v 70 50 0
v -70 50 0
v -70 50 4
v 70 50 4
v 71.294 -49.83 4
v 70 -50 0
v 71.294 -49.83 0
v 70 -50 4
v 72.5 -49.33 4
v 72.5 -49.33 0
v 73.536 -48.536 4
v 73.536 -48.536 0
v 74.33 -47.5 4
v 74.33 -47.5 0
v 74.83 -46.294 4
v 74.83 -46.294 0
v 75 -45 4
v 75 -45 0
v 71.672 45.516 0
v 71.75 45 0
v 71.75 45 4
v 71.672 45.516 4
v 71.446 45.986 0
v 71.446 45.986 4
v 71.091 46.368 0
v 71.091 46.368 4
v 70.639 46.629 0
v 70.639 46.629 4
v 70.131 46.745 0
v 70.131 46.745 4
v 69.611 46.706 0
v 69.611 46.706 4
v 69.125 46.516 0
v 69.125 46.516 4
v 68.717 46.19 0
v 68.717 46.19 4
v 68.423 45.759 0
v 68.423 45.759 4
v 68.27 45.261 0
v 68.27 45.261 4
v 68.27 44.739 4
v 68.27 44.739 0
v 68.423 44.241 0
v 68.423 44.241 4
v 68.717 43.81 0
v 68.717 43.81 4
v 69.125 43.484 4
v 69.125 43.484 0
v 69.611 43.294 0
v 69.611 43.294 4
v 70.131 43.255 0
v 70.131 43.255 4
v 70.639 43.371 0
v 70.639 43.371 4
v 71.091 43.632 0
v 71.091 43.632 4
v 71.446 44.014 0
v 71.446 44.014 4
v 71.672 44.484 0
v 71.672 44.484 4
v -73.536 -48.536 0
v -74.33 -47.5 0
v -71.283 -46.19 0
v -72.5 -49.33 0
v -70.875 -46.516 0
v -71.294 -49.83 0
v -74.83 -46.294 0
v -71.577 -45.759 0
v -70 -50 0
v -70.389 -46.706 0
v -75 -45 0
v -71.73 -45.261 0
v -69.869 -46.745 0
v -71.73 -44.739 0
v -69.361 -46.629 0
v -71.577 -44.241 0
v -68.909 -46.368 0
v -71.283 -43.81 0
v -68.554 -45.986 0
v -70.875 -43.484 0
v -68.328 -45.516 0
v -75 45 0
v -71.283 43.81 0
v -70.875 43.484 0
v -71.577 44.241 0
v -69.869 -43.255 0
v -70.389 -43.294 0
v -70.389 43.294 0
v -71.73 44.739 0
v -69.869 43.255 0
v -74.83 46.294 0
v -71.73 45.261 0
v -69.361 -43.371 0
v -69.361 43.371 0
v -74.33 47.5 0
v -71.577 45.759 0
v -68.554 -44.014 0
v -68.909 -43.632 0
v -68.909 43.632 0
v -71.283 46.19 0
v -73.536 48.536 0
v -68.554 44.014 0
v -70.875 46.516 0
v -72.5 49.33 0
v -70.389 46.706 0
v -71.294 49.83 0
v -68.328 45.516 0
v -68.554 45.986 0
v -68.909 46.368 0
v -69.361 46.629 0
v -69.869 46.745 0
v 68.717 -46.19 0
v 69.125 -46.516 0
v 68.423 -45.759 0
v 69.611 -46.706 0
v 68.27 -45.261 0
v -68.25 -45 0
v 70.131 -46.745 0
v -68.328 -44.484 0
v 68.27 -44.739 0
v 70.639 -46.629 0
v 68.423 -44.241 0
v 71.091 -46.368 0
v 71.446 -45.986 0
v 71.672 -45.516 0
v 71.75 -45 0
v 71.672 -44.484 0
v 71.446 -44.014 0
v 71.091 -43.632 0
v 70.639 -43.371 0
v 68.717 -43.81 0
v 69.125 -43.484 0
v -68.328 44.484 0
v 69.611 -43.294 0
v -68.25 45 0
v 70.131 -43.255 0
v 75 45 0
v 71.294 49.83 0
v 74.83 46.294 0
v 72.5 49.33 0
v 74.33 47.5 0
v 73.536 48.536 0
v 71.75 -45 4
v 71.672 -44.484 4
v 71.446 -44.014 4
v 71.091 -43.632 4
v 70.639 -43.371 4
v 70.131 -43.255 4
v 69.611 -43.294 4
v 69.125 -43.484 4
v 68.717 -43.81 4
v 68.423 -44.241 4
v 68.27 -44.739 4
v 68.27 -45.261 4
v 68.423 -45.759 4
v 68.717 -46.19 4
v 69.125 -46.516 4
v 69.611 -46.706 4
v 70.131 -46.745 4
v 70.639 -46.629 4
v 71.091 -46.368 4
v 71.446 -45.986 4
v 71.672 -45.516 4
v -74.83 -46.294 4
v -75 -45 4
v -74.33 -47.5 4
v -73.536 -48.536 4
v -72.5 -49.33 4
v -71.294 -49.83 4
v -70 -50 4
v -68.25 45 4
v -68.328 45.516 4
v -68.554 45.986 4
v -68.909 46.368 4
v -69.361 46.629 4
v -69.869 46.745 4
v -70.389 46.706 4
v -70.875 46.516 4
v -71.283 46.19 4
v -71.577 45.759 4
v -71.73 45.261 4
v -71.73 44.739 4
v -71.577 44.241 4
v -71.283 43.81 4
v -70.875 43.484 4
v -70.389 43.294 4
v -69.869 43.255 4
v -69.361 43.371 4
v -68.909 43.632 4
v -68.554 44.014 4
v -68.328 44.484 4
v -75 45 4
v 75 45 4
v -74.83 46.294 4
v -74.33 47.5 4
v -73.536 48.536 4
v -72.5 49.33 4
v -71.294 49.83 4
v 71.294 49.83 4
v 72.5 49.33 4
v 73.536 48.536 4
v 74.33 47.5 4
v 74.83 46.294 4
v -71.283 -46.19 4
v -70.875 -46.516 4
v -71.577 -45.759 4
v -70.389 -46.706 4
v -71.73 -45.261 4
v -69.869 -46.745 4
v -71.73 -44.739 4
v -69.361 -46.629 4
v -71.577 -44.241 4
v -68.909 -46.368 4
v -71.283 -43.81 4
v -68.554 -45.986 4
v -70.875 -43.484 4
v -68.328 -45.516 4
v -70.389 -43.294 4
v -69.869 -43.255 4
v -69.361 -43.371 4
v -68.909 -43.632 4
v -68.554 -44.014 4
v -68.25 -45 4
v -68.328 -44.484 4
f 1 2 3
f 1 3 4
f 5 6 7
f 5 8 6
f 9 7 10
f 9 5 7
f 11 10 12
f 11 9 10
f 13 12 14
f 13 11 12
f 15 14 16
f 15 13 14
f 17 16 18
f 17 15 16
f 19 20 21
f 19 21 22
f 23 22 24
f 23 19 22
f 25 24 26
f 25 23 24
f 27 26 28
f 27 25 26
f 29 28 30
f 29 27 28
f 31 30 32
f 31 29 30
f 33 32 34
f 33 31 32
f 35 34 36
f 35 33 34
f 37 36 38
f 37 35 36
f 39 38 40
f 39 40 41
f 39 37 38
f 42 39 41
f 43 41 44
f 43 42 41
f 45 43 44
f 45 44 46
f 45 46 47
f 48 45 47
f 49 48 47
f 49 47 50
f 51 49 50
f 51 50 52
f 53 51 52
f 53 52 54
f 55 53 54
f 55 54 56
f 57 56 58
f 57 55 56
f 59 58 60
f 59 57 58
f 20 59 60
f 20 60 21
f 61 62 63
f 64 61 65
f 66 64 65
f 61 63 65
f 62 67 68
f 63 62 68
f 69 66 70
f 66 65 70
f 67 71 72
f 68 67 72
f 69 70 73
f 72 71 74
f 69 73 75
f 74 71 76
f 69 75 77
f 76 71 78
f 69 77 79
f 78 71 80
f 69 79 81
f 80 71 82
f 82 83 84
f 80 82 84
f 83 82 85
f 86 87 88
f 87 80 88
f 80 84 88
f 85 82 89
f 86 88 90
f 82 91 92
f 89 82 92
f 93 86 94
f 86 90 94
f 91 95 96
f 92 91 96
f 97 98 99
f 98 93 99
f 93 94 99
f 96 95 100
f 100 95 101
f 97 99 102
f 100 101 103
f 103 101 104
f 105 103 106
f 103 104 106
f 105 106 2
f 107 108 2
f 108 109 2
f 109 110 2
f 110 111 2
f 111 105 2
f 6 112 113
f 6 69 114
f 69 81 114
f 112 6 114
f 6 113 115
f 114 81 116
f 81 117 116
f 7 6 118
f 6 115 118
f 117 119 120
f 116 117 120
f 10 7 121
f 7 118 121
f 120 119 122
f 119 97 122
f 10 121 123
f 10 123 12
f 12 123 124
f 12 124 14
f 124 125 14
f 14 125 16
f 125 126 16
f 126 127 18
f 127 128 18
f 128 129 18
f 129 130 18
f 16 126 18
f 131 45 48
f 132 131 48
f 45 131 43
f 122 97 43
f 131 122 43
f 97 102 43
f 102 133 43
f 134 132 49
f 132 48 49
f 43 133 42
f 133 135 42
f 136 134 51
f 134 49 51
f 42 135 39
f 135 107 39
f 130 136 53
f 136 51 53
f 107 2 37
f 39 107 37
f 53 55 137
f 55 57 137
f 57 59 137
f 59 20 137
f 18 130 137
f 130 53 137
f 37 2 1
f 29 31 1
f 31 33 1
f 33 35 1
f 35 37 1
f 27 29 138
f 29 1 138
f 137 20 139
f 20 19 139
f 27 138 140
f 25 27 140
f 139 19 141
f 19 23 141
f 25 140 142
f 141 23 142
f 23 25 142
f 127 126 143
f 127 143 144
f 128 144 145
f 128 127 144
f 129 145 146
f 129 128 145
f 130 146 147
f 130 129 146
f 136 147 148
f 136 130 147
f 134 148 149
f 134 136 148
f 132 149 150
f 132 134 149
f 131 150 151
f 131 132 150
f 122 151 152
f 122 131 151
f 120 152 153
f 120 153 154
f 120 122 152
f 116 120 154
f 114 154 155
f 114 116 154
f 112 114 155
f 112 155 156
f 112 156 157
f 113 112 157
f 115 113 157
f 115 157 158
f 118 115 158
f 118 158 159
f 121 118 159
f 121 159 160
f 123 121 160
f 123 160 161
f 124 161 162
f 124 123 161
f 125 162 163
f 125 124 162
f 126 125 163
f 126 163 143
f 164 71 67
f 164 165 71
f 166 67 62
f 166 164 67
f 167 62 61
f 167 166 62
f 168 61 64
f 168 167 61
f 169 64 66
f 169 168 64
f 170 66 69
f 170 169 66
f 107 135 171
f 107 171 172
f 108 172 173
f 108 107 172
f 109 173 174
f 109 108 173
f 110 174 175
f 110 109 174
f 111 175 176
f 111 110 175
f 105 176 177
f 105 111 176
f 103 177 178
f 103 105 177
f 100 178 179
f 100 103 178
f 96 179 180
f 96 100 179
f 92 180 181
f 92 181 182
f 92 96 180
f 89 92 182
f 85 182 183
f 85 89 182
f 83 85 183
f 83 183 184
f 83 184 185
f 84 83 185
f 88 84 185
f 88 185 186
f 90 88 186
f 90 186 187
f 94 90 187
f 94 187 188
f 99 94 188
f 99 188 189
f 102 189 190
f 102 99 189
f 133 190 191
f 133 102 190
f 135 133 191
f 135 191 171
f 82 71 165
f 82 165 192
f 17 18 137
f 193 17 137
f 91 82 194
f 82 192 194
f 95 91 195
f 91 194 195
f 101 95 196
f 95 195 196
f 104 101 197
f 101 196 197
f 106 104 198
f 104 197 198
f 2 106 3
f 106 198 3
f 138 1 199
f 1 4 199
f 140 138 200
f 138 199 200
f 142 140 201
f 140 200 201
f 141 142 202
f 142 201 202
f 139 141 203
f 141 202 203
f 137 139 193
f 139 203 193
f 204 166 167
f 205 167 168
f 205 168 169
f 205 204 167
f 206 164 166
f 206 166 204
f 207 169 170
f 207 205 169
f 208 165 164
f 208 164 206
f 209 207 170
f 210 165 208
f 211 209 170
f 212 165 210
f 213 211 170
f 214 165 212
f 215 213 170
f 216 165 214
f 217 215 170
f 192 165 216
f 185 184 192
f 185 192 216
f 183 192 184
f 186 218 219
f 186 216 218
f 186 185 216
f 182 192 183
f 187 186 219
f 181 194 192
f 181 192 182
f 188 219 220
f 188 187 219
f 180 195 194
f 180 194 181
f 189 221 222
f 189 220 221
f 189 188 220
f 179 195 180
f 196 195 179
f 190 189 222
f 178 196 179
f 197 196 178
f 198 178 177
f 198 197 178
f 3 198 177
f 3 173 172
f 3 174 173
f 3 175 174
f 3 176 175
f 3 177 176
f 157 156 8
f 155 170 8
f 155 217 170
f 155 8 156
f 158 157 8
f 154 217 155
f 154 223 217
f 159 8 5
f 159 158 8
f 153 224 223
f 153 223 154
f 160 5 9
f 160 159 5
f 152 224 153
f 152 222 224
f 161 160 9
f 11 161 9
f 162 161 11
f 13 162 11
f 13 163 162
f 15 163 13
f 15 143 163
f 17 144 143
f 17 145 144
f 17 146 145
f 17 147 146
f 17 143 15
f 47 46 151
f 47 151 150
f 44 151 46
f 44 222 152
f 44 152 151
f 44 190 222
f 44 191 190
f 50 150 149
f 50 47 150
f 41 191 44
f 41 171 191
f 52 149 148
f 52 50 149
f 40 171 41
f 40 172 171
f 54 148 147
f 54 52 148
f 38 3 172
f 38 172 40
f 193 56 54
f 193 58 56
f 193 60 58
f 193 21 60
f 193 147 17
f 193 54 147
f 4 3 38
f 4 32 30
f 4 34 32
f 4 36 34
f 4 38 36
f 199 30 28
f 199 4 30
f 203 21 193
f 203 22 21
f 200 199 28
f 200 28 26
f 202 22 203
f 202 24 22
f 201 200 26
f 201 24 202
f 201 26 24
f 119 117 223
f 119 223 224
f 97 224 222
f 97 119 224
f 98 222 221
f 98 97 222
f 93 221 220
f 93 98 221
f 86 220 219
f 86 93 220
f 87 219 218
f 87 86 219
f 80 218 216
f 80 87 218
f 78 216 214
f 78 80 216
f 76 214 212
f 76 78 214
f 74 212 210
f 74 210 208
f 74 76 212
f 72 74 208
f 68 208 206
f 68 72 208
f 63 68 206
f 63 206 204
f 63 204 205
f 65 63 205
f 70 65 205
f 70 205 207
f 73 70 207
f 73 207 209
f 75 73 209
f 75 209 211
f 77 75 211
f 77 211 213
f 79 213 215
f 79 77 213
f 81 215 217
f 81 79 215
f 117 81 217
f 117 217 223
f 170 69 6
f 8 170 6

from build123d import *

# Parameters (mm, degrees)
F0_W     = 150
F0_H     = 100
F0_R     = 1.75
F1_DEPTH = 4
F2_R     = 5


with BuildPart() as f1:
    # F0 (on Top) → F1 (new body)
    with BuildSketch(Plane.XY):
        Rectangle(F0_W, F0_H)
        with Locations((-70, -45)):
            Circle(F0_R, mode=Mode.SUBTRACT)
        with Locations((70, -45)):
            Circle(F0_R, mode=Mode.SUBTRACT)
        with Locations((-70, 45)):
            Circle(F0_R, mode=Mode.SUBTRACT)
        with Locations((70, 45)):
            Circle(F0_R, mode=Mode.SUBTRACT)
    extrude(amount=F1_DEPTH)

    # F2
    f2_edges = [f1.edges().sort_by_distance(p)[0] for p in [
        (-75, 50, 2),
        (75, 50, 2),
        (75, -50, 2),
        (-75, -50, 2),
    ]]
    fillet(f2_edges, radius=F2_R)


solid = f1.part
